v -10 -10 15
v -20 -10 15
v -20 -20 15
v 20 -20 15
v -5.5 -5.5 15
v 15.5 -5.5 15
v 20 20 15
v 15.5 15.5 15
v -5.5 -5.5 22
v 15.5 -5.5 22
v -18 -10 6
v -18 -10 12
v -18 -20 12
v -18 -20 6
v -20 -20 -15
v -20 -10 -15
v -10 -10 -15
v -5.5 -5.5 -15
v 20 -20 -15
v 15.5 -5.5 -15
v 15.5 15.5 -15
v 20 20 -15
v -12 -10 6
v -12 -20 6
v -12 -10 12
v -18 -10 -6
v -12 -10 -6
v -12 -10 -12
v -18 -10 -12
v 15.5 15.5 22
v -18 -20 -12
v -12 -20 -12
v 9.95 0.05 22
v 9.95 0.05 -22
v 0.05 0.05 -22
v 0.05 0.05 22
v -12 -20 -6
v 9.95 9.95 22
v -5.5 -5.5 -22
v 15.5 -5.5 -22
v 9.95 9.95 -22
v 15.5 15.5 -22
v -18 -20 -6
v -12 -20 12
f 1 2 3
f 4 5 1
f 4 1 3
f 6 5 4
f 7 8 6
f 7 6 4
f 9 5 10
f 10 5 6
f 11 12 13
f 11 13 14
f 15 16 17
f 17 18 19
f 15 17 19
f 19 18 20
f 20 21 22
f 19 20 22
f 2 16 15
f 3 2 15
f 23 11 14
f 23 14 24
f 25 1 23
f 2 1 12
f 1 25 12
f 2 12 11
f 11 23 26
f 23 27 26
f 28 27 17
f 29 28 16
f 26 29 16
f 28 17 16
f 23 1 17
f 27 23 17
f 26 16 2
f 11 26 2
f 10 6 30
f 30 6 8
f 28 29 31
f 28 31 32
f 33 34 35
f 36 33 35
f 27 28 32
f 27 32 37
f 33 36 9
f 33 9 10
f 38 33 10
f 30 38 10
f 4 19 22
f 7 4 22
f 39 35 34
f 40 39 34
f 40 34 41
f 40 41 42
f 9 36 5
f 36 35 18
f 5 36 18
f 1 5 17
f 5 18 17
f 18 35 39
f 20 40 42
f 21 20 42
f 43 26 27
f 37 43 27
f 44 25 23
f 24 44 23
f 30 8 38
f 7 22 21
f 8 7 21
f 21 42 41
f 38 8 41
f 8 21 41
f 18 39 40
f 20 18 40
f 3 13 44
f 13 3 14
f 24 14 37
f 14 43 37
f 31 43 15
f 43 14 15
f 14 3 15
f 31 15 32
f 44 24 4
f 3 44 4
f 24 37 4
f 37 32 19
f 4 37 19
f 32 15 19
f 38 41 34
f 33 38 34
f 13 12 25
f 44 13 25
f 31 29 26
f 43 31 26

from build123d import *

# Parameters (mm, degrees)
EXTRUDE_3_DEPTH      = 15
EXTRUDE_3_DEPTH_BACK = 15
EXTRUDE_4_DEPTH      = 22
EXTRUDE_4_DEPTH_BACK = 22
SKETCH_2_W           = 6
SKETCH_2_H           = 6
CUT_EXTRUDE_2_DEPTH  = 43.237424164


with BuildPart() as part:
    # Эскиз1 → Бобышка-Вытянуть3 (new, two sides: drawn at the far end of the back side and taken through both)
    with BuildSketch(Plane.XY.offset(-EXTRUDE_3_DEPTH_BACK)):
        Polygon((-10, -10), (-20, -10), (-20, -20), (20, -20), (20, 20), (15.5, 15.5), (15.5, -5.5), (-5.5, -5.5), align=None)
    extrude(amount=EXTRUDE_3_DEPTH + EXTRUDE_3_DEPTH_BACK)

    # Эскиз1<6> → Бобышка-Вытянуть4 (add, two sides: drawn at the far end of the back side and taken through both)
    with BuildSketch(Plane.XY.offset(-EXTRUDE_4_DEPTH_BACK)):
        Polygon((0.050252532, 0.050252532), (-5.5, -5.5), (15.5, -5.5), (15.5, 15.5), (9.949747468, 9.949747468), (9.949747468, 0.050252532), align=None)
    extrude(amount=EXTRUDE_4_DEPTH + EXTRUDE_4_DEPTH_BACK)

    # Эскиз2 → Вырез-Вытянуть2 (cut, through all)
    with BuildSketch(Plane(origin=(0, -10, 0), x_dir=(1, 0, 0), z_dir=(0, 1, 0))):
        with Locations((-15, -9)):
            Rectangle(SKETCH_2_W, SKETCH_2_H)
    cut_extrude_2 = extrude(amount=-CUT_EXTRUDE_2_DEPTH, mode=Mode.SUBTRACT)

    # Зеркальное отражение1: Вырез-Вытянуть2 across plane
    add(cut_extrude_2.mirror(Plane.XY), mode=Mode.SUBTRACT)


solid = part.part
